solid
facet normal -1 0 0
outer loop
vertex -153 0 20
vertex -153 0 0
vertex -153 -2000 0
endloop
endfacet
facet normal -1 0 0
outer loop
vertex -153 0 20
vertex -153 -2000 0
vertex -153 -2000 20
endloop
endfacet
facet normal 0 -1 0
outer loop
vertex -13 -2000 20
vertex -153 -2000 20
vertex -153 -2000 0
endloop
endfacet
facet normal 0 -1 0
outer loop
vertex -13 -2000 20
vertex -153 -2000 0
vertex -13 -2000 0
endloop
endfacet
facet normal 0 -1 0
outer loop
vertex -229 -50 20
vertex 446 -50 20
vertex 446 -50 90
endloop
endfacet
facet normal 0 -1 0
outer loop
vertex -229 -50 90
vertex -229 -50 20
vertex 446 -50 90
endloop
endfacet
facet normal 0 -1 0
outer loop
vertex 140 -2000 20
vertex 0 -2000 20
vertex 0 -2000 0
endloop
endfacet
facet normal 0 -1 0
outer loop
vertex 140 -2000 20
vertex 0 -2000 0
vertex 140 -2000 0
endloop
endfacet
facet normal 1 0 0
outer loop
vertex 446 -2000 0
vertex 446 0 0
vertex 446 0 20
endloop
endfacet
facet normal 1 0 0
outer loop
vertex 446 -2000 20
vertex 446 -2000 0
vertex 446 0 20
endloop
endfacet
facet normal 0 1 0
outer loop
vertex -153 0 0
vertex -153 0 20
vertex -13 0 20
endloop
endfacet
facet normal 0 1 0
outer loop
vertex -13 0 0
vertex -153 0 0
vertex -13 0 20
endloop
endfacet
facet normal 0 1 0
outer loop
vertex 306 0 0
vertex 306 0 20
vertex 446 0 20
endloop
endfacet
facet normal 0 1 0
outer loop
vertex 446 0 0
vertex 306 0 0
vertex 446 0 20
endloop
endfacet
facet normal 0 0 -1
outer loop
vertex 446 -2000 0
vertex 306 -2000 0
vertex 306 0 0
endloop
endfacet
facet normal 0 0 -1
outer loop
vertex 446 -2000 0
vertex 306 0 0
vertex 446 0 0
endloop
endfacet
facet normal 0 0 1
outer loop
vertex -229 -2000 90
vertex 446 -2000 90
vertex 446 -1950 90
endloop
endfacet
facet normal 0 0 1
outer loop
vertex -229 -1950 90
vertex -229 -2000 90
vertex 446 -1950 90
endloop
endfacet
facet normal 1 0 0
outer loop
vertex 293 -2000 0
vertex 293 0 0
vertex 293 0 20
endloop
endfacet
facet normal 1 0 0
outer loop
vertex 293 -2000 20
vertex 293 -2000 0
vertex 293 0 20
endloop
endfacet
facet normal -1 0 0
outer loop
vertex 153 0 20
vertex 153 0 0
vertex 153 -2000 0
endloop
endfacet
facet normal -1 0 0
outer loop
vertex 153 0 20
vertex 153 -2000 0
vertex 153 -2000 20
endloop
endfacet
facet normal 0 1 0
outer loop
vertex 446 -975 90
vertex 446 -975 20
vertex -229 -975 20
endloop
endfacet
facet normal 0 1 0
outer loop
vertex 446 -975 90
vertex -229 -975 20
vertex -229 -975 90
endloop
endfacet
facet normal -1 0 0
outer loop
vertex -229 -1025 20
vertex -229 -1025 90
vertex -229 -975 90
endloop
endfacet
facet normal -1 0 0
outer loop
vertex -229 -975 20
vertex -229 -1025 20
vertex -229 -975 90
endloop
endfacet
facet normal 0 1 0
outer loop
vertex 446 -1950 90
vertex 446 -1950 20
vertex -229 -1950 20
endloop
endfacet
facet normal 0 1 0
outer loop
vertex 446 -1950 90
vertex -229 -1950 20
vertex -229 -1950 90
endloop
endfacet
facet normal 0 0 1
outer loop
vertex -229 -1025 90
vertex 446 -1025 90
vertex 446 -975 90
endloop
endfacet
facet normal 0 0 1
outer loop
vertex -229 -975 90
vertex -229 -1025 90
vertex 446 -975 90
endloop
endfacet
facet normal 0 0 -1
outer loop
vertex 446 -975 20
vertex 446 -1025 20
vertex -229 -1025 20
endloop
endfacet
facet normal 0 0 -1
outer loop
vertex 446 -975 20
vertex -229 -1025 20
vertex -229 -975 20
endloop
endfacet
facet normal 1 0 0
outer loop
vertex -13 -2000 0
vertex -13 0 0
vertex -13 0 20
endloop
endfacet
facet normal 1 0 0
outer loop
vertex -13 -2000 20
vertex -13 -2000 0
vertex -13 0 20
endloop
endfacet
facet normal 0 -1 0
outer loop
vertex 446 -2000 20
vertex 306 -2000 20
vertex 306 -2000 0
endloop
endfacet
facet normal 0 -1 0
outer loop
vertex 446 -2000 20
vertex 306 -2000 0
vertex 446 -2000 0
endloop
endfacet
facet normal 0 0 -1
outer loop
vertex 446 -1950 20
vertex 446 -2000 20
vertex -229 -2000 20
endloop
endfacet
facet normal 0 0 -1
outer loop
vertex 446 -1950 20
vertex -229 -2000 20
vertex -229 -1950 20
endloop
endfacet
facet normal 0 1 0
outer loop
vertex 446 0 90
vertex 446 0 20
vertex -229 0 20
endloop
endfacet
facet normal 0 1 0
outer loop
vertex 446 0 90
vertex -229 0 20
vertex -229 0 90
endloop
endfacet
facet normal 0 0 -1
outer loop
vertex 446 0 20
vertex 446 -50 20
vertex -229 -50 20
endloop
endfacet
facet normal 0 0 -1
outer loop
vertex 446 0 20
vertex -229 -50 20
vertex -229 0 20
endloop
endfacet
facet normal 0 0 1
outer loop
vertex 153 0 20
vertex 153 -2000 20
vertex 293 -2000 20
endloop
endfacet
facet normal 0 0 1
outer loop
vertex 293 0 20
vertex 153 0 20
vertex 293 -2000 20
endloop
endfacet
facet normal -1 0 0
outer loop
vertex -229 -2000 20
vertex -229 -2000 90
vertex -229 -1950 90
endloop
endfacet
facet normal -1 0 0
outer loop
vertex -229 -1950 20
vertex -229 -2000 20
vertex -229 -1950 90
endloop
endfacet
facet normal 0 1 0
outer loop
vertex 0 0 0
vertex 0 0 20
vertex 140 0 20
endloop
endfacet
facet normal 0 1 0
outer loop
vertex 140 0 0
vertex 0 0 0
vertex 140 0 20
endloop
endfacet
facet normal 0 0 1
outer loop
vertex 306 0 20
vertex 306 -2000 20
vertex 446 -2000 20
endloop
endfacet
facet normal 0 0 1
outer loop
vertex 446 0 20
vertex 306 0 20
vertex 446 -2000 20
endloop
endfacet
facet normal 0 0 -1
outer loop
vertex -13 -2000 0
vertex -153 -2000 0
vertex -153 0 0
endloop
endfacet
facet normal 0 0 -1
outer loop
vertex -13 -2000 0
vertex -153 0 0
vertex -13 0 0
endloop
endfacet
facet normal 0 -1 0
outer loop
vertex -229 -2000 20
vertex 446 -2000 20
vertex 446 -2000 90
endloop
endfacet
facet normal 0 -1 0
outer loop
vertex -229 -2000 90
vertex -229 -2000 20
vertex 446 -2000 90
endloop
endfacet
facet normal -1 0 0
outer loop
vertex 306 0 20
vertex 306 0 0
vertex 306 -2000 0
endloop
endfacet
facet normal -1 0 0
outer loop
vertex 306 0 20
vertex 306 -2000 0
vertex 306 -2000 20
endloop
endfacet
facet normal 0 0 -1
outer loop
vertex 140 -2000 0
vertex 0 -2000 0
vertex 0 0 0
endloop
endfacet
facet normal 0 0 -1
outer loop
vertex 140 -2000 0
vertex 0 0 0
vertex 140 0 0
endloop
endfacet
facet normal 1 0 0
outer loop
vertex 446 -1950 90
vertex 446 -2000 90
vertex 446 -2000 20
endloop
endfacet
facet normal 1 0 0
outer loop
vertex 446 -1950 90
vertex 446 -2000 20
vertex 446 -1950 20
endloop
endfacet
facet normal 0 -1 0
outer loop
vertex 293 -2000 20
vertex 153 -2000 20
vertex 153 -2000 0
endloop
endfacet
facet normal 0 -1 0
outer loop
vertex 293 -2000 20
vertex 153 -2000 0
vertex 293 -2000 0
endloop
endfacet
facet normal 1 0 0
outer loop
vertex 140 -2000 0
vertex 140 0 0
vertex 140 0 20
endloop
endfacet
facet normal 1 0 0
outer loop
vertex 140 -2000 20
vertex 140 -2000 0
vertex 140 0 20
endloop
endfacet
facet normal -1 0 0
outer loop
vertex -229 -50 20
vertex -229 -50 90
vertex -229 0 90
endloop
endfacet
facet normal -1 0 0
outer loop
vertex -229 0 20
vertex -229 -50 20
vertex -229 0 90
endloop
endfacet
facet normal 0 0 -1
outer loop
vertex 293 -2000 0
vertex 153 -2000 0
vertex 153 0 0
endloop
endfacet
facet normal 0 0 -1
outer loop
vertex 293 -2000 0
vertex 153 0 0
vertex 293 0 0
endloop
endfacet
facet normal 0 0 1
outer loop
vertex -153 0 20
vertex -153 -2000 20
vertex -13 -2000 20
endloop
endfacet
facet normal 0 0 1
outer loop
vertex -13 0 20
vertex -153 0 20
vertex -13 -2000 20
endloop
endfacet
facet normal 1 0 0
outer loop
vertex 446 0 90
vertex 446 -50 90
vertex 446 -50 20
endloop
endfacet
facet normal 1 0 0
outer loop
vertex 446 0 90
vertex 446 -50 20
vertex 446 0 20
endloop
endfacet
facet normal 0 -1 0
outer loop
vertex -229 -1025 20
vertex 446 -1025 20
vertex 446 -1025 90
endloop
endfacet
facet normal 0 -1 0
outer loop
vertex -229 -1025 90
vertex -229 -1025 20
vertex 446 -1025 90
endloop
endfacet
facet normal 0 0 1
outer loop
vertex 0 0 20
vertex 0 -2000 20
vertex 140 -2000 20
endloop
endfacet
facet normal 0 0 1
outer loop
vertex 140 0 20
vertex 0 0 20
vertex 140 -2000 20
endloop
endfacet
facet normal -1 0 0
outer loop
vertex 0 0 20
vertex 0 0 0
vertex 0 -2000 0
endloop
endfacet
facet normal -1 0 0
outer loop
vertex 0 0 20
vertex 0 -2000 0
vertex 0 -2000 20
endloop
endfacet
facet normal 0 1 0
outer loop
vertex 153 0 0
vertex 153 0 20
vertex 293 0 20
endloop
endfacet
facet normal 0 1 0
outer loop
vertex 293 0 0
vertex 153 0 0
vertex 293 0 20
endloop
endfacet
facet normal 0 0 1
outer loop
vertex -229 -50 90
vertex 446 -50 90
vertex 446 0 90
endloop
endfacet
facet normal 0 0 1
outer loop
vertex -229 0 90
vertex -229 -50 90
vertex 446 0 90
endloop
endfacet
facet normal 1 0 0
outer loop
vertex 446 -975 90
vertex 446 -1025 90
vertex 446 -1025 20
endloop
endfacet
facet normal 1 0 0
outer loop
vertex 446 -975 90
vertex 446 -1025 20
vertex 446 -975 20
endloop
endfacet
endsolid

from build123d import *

# Parameters (mm, degrees)
F0_W     = 140
F0_H     = 20
F1_DEPTH = 2000
F2_W     = 50
F2_H     = 70
F3_W     = 50
F3_H     = 70
F4_DEPTH = 675


with BuildPart() as f1:
    # F0 (on Front) → F1 (new body)
    with BuildSketch(Plane.XZ):
        with Locations((70, 10)):
            Rectangle(F0_W, F0_H)
        with Locations((223, 10)):
            Rectangle(F0_W, F0_H)
        with Locations((376, 10)):
            Rectangle(F0_W, F0_H)
        with Locations((-83, 10)):
            Rectangle(F0_W, F0_H)
    extrude(amount=F1_DEPTH)


with BuildPart() as f4:
    # F2 (on face) + F3 (on face) → F4 (new body)
    with BuildSketch(Plane.YZ.offset(446)):
        with Locations((-1975, 55)):
            Rectangle(F2_W, F2_H)
        with Locations((-25, 55)):
            Rectangle(F2_W, F2_H)
    with BuildSketch(Plane.YZ.offset(446)):
        with Locations((-1000, 55)):
            Rectangle(F3_W, F3_H)
    extrude(amount=-F4_DEPTH)


solid = Compound([f1.part, f4.part])
